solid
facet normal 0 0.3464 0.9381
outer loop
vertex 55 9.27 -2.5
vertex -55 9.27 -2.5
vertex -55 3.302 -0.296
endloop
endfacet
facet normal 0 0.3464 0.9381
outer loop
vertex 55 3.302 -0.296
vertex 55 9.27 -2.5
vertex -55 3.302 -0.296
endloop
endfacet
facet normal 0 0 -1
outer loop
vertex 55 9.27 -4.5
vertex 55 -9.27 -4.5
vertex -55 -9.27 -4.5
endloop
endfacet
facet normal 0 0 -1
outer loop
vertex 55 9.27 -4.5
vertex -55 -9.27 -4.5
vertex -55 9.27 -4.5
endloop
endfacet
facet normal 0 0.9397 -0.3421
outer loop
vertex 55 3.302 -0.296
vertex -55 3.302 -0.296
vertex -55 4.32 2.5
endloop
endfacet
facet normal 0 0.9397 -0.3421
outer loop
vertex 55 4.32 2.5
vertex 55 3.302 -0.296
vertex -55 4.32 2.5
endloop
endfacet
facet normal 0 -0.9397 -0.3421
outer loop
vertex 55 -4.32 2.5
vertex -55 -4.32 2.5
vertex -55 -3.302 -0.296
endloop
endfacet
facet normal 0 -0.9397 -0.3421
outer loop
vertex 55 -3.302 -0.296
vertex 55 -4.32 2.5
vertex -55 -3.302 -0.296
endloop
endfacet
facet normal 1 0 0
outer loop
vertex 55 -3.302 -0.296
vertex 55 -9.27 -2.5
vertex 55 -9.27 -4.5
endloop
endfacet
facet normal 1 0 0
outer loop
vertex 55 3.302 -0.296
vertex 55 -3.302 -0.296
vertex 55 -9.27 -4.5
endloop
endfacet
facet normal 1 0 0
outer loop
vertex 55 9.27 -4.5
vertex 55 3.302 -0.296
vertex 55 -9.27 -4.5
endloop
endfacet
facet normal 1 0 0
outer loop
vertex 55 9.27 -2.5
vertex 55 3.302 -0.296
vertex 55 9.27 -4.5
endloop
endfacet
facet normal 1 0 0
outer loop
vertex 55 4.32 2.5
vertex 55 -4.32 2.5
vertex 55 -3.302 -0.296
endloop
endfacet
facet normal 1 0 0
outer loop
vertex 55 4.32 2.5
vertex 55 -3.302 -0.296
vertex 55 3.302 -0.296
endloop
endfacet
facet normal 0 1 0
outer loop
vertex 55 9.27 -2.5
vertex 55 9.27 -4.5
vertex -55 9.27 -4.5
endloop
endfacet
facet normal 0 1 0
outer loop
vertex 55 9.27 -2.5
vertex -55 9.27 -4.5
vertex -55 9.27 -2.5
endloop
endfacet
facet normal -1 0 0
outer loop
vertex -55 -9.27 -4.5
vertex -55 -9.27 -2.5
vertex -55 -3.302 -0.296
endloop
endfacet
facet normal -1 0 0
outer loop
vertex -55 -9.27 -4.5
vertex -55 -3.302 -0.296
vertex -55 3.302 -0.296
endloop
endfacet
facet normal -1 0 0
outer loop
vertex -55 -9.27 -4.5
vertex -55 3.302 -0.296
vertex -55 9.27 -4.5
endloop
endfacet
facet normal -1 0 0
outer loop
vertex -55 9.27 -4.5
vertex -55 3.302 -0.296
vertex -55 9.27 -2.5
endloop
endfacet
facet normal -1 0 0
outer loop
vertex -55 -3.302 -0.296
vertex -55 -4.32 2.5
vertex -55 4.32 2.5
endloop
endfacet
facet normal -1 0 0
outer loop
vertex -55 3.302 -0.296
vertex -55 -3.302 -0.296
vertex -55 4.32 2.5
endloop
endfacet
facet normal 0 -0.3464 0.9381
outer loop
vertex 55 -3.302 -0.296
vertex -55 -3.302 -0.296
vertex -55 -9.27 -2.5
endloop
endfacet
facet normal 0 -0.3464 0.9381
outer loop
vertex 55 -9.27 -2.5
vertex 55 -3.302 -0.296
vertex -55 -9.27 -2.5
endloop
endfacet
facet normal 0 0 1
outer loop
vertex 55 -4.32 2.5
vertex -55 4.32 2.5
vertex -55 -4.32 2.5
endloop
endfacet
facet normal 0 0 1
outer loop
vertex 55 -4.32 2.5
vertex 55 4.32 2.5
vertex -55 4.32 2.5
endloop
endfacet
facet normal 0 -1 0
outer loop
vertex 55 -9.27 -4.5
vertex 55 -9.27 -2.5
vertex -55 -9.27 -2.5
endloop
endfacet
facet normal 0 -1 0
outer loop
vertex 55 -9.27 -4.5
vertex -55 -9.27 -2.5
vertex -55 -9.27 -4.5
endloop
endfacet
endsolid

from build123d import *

# Parameters (mm, degrees)
F2_DEPTH      = 55
F2_DEPTH_BACK = 55


with BuildPart() as f2:
    # F1 (on Right) → F2 (new body, two sides)
    with BuildSketch(Plane.YZ) as f2_sk:
        Polygon((-9.27, -2.5), (-2.5, -2.5), (-3.3021166542, -0.2962026049), align=None)
        Polygon((3.3021166542, -0.2962026049), (2.5, 0), (2.5, -2.5), align=None)
        Polygon((-2.5, 0), (-2.5, 2.5), (-4.3198511713, 2.5), (-3.3021166542, -0.2962026049), align=None)
        Polygon((2.5, -2.5), (-2.5, -2.5), (-9.27, -2.5), (-9.27, -4.5), (9.27, -4.5), (9.27, -2.5), align=None)
        Polygon((2.5, 2.5), (-2.5, 2.5), (-2.5, 0), (-2.5, -2.5), (2.5, -2.5), (2.5, 0), align=None)
        Polygon((4.3198511713, 2.5), (2.5, 2.5), (2.5, 0), (3.3021166542, -0.2962026049), align=None)
        Polygon((-2.5, -2.5), (-2.5, 0), (-3.3021166542, -0.2962026049), align=None)
        Polygon((3.3021166542, -0.2962026049), (2.5, -2.5), (9.27, -2.5), align=None)
    extrude(amount=F2_DEPTH)
    extrude(f2_sk.sketch, amount=-F2_DEPTH_BACK)


solid = f2.part
